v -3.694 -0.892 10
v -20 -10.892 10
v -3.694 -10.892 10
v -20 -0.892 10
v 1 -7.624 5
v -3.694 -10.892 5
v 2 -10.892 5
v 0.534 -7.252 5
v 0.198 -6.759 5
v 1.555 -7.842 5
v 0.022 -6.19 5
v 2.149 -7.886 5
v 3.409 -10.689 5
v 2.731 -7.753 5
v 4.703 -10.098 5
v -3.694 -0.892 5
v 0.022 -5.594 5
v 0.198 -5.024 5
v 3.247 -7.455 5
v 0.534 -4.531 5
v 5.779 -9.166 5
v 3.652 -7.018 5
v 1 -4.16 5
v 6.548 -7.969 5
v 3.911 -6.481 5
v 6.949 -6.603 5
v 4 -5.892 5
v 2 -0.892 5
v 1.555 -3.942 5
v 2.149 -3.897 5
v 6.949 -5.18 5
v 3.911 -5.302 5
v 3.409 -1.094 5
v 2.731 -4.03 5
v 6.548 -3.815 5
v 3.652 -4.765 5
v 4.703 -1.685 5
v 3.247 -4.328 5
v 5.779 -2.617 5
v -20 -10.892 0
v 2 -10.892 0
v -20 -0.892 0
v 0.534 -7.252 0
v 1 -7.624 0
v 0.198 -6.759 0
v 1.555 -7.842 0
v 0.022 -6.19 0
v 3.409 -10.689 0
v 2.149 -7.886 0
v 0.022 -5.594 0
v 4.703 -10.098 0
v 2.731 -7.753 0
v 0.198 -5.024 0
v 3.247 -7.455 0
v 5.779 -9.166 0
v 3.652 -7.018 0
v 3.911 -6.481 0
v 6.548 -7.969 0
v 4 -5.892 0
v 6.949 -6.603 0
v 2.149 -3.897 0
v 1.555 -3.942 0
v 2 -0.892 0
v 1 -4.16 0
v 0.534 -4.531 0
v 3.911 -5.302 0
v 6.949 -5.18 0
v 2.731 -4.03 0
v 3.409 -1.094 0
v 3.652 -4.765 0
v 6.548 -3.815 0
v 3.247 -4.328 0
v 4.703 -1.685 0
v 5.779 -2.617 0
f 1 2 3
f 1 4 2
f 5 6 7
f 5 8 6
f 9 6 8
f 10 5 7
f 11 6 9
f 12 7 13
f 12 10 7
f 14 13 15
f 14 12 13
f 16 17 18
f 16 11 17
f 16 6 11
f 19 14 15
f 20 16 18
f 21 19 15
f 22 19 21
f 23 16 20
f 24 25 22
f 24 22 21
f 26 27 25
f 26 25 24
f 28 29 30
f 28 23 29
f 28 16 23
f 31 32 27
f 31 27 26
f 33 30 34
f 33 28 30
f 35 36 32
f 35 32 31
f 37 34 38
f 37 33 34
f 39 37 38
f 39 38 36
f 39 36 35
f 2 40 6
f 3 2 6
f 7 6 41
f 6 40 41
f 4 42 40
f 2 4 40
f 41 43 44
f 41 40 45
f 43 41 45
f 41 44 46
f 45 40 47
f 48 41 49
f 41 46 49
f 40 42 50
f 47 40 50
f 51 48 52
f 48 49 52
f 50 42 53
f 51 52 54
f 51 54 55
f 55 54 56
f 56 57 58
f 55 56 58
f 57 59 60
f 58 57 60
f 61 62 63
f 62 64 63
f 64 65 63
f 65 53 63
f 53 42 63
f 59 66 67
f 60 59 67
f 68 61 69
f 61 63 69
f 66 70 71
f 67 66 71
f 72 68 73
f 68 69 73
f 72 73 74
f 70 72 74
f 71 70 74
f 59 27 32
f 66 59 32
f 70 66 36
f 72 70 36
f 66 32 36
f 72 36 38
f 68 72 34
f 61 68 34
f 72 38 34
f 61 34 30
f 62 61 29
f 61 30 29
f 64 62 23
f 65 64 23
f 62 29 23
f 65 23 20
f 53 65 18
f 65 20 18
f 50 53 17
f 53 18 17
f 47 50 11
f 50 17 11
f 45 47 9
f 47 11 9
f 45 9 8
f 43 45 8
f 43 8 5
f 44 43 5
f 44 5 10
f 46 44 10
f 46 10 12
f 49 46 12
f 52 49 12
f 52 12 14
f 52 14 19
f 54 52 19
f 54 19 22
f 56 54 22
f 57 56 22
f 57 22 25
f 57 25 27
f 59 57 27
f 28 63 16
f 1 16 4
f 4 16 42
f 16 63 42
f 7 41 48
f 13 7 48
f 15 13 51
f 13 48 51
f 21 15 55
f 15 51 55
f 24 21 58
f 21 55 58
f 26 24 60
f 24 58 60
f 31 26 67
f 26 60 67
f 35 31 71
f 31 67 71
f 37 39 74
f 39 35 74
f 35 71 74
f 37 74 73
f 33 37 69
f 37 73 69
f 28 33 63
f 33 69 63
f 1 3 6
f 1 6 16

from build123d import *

# Parameters (mm, degrees)
BOSS_EXTRUDE1_DEPTH = 10
SKETCH2_R           = 2
CUT_EXTRUDE1_DEPTH  = 30
SKETCH4_W           = 18.757466853
SKETCH4_H           = 10.0829174
CUT_EXTRUDE3_DEPTH  = 5


with BuildPart() as part:
    # Sketch1 → Boss-Extrude1 (new body)
    with BuildSketch(Plane.XY):
        with BuildLine():
            Line((0, -10.891659923), (2, -10.891659923))
            ThreePointArc((2, -10.891659923), (7, -5.891659923), (2, -0.891659923))
            Line((2, -0.891659923), (-20, -0.891659923))
            Line((-20, -0.891659923), (-20, -10.891659923))
            Line((-20, -10.891659923), (0, -10.891659923))
        make_face()
    extrude(amount=BOSS_EXTRUDE1_DEPTH)

    # Sketch2 → Cut-Extrude1 (cut)
    with BuildSketch(Plane.XY.offset(10)):
        with Locations((2, -5.891659923)):
            Circle(SKETCH2_R)
    extrude(amount=-CUT_EXTRUDE1_DEPTH, mode=Mode.SUBTRACT)

    # Sketch4 → Cut-Extrude3 (cut)
    with BuildSketch(Plane.XY.offset(10)):
        with Locations((5.685057141, -5.933118623)):
            Rectangle(SKETCH4_W, SKETCH4_H)
    extrude(amount=-CUT_EXTRUDE3_DEPTH, mode=Mode.SUBTRACT)


solid = part.part
